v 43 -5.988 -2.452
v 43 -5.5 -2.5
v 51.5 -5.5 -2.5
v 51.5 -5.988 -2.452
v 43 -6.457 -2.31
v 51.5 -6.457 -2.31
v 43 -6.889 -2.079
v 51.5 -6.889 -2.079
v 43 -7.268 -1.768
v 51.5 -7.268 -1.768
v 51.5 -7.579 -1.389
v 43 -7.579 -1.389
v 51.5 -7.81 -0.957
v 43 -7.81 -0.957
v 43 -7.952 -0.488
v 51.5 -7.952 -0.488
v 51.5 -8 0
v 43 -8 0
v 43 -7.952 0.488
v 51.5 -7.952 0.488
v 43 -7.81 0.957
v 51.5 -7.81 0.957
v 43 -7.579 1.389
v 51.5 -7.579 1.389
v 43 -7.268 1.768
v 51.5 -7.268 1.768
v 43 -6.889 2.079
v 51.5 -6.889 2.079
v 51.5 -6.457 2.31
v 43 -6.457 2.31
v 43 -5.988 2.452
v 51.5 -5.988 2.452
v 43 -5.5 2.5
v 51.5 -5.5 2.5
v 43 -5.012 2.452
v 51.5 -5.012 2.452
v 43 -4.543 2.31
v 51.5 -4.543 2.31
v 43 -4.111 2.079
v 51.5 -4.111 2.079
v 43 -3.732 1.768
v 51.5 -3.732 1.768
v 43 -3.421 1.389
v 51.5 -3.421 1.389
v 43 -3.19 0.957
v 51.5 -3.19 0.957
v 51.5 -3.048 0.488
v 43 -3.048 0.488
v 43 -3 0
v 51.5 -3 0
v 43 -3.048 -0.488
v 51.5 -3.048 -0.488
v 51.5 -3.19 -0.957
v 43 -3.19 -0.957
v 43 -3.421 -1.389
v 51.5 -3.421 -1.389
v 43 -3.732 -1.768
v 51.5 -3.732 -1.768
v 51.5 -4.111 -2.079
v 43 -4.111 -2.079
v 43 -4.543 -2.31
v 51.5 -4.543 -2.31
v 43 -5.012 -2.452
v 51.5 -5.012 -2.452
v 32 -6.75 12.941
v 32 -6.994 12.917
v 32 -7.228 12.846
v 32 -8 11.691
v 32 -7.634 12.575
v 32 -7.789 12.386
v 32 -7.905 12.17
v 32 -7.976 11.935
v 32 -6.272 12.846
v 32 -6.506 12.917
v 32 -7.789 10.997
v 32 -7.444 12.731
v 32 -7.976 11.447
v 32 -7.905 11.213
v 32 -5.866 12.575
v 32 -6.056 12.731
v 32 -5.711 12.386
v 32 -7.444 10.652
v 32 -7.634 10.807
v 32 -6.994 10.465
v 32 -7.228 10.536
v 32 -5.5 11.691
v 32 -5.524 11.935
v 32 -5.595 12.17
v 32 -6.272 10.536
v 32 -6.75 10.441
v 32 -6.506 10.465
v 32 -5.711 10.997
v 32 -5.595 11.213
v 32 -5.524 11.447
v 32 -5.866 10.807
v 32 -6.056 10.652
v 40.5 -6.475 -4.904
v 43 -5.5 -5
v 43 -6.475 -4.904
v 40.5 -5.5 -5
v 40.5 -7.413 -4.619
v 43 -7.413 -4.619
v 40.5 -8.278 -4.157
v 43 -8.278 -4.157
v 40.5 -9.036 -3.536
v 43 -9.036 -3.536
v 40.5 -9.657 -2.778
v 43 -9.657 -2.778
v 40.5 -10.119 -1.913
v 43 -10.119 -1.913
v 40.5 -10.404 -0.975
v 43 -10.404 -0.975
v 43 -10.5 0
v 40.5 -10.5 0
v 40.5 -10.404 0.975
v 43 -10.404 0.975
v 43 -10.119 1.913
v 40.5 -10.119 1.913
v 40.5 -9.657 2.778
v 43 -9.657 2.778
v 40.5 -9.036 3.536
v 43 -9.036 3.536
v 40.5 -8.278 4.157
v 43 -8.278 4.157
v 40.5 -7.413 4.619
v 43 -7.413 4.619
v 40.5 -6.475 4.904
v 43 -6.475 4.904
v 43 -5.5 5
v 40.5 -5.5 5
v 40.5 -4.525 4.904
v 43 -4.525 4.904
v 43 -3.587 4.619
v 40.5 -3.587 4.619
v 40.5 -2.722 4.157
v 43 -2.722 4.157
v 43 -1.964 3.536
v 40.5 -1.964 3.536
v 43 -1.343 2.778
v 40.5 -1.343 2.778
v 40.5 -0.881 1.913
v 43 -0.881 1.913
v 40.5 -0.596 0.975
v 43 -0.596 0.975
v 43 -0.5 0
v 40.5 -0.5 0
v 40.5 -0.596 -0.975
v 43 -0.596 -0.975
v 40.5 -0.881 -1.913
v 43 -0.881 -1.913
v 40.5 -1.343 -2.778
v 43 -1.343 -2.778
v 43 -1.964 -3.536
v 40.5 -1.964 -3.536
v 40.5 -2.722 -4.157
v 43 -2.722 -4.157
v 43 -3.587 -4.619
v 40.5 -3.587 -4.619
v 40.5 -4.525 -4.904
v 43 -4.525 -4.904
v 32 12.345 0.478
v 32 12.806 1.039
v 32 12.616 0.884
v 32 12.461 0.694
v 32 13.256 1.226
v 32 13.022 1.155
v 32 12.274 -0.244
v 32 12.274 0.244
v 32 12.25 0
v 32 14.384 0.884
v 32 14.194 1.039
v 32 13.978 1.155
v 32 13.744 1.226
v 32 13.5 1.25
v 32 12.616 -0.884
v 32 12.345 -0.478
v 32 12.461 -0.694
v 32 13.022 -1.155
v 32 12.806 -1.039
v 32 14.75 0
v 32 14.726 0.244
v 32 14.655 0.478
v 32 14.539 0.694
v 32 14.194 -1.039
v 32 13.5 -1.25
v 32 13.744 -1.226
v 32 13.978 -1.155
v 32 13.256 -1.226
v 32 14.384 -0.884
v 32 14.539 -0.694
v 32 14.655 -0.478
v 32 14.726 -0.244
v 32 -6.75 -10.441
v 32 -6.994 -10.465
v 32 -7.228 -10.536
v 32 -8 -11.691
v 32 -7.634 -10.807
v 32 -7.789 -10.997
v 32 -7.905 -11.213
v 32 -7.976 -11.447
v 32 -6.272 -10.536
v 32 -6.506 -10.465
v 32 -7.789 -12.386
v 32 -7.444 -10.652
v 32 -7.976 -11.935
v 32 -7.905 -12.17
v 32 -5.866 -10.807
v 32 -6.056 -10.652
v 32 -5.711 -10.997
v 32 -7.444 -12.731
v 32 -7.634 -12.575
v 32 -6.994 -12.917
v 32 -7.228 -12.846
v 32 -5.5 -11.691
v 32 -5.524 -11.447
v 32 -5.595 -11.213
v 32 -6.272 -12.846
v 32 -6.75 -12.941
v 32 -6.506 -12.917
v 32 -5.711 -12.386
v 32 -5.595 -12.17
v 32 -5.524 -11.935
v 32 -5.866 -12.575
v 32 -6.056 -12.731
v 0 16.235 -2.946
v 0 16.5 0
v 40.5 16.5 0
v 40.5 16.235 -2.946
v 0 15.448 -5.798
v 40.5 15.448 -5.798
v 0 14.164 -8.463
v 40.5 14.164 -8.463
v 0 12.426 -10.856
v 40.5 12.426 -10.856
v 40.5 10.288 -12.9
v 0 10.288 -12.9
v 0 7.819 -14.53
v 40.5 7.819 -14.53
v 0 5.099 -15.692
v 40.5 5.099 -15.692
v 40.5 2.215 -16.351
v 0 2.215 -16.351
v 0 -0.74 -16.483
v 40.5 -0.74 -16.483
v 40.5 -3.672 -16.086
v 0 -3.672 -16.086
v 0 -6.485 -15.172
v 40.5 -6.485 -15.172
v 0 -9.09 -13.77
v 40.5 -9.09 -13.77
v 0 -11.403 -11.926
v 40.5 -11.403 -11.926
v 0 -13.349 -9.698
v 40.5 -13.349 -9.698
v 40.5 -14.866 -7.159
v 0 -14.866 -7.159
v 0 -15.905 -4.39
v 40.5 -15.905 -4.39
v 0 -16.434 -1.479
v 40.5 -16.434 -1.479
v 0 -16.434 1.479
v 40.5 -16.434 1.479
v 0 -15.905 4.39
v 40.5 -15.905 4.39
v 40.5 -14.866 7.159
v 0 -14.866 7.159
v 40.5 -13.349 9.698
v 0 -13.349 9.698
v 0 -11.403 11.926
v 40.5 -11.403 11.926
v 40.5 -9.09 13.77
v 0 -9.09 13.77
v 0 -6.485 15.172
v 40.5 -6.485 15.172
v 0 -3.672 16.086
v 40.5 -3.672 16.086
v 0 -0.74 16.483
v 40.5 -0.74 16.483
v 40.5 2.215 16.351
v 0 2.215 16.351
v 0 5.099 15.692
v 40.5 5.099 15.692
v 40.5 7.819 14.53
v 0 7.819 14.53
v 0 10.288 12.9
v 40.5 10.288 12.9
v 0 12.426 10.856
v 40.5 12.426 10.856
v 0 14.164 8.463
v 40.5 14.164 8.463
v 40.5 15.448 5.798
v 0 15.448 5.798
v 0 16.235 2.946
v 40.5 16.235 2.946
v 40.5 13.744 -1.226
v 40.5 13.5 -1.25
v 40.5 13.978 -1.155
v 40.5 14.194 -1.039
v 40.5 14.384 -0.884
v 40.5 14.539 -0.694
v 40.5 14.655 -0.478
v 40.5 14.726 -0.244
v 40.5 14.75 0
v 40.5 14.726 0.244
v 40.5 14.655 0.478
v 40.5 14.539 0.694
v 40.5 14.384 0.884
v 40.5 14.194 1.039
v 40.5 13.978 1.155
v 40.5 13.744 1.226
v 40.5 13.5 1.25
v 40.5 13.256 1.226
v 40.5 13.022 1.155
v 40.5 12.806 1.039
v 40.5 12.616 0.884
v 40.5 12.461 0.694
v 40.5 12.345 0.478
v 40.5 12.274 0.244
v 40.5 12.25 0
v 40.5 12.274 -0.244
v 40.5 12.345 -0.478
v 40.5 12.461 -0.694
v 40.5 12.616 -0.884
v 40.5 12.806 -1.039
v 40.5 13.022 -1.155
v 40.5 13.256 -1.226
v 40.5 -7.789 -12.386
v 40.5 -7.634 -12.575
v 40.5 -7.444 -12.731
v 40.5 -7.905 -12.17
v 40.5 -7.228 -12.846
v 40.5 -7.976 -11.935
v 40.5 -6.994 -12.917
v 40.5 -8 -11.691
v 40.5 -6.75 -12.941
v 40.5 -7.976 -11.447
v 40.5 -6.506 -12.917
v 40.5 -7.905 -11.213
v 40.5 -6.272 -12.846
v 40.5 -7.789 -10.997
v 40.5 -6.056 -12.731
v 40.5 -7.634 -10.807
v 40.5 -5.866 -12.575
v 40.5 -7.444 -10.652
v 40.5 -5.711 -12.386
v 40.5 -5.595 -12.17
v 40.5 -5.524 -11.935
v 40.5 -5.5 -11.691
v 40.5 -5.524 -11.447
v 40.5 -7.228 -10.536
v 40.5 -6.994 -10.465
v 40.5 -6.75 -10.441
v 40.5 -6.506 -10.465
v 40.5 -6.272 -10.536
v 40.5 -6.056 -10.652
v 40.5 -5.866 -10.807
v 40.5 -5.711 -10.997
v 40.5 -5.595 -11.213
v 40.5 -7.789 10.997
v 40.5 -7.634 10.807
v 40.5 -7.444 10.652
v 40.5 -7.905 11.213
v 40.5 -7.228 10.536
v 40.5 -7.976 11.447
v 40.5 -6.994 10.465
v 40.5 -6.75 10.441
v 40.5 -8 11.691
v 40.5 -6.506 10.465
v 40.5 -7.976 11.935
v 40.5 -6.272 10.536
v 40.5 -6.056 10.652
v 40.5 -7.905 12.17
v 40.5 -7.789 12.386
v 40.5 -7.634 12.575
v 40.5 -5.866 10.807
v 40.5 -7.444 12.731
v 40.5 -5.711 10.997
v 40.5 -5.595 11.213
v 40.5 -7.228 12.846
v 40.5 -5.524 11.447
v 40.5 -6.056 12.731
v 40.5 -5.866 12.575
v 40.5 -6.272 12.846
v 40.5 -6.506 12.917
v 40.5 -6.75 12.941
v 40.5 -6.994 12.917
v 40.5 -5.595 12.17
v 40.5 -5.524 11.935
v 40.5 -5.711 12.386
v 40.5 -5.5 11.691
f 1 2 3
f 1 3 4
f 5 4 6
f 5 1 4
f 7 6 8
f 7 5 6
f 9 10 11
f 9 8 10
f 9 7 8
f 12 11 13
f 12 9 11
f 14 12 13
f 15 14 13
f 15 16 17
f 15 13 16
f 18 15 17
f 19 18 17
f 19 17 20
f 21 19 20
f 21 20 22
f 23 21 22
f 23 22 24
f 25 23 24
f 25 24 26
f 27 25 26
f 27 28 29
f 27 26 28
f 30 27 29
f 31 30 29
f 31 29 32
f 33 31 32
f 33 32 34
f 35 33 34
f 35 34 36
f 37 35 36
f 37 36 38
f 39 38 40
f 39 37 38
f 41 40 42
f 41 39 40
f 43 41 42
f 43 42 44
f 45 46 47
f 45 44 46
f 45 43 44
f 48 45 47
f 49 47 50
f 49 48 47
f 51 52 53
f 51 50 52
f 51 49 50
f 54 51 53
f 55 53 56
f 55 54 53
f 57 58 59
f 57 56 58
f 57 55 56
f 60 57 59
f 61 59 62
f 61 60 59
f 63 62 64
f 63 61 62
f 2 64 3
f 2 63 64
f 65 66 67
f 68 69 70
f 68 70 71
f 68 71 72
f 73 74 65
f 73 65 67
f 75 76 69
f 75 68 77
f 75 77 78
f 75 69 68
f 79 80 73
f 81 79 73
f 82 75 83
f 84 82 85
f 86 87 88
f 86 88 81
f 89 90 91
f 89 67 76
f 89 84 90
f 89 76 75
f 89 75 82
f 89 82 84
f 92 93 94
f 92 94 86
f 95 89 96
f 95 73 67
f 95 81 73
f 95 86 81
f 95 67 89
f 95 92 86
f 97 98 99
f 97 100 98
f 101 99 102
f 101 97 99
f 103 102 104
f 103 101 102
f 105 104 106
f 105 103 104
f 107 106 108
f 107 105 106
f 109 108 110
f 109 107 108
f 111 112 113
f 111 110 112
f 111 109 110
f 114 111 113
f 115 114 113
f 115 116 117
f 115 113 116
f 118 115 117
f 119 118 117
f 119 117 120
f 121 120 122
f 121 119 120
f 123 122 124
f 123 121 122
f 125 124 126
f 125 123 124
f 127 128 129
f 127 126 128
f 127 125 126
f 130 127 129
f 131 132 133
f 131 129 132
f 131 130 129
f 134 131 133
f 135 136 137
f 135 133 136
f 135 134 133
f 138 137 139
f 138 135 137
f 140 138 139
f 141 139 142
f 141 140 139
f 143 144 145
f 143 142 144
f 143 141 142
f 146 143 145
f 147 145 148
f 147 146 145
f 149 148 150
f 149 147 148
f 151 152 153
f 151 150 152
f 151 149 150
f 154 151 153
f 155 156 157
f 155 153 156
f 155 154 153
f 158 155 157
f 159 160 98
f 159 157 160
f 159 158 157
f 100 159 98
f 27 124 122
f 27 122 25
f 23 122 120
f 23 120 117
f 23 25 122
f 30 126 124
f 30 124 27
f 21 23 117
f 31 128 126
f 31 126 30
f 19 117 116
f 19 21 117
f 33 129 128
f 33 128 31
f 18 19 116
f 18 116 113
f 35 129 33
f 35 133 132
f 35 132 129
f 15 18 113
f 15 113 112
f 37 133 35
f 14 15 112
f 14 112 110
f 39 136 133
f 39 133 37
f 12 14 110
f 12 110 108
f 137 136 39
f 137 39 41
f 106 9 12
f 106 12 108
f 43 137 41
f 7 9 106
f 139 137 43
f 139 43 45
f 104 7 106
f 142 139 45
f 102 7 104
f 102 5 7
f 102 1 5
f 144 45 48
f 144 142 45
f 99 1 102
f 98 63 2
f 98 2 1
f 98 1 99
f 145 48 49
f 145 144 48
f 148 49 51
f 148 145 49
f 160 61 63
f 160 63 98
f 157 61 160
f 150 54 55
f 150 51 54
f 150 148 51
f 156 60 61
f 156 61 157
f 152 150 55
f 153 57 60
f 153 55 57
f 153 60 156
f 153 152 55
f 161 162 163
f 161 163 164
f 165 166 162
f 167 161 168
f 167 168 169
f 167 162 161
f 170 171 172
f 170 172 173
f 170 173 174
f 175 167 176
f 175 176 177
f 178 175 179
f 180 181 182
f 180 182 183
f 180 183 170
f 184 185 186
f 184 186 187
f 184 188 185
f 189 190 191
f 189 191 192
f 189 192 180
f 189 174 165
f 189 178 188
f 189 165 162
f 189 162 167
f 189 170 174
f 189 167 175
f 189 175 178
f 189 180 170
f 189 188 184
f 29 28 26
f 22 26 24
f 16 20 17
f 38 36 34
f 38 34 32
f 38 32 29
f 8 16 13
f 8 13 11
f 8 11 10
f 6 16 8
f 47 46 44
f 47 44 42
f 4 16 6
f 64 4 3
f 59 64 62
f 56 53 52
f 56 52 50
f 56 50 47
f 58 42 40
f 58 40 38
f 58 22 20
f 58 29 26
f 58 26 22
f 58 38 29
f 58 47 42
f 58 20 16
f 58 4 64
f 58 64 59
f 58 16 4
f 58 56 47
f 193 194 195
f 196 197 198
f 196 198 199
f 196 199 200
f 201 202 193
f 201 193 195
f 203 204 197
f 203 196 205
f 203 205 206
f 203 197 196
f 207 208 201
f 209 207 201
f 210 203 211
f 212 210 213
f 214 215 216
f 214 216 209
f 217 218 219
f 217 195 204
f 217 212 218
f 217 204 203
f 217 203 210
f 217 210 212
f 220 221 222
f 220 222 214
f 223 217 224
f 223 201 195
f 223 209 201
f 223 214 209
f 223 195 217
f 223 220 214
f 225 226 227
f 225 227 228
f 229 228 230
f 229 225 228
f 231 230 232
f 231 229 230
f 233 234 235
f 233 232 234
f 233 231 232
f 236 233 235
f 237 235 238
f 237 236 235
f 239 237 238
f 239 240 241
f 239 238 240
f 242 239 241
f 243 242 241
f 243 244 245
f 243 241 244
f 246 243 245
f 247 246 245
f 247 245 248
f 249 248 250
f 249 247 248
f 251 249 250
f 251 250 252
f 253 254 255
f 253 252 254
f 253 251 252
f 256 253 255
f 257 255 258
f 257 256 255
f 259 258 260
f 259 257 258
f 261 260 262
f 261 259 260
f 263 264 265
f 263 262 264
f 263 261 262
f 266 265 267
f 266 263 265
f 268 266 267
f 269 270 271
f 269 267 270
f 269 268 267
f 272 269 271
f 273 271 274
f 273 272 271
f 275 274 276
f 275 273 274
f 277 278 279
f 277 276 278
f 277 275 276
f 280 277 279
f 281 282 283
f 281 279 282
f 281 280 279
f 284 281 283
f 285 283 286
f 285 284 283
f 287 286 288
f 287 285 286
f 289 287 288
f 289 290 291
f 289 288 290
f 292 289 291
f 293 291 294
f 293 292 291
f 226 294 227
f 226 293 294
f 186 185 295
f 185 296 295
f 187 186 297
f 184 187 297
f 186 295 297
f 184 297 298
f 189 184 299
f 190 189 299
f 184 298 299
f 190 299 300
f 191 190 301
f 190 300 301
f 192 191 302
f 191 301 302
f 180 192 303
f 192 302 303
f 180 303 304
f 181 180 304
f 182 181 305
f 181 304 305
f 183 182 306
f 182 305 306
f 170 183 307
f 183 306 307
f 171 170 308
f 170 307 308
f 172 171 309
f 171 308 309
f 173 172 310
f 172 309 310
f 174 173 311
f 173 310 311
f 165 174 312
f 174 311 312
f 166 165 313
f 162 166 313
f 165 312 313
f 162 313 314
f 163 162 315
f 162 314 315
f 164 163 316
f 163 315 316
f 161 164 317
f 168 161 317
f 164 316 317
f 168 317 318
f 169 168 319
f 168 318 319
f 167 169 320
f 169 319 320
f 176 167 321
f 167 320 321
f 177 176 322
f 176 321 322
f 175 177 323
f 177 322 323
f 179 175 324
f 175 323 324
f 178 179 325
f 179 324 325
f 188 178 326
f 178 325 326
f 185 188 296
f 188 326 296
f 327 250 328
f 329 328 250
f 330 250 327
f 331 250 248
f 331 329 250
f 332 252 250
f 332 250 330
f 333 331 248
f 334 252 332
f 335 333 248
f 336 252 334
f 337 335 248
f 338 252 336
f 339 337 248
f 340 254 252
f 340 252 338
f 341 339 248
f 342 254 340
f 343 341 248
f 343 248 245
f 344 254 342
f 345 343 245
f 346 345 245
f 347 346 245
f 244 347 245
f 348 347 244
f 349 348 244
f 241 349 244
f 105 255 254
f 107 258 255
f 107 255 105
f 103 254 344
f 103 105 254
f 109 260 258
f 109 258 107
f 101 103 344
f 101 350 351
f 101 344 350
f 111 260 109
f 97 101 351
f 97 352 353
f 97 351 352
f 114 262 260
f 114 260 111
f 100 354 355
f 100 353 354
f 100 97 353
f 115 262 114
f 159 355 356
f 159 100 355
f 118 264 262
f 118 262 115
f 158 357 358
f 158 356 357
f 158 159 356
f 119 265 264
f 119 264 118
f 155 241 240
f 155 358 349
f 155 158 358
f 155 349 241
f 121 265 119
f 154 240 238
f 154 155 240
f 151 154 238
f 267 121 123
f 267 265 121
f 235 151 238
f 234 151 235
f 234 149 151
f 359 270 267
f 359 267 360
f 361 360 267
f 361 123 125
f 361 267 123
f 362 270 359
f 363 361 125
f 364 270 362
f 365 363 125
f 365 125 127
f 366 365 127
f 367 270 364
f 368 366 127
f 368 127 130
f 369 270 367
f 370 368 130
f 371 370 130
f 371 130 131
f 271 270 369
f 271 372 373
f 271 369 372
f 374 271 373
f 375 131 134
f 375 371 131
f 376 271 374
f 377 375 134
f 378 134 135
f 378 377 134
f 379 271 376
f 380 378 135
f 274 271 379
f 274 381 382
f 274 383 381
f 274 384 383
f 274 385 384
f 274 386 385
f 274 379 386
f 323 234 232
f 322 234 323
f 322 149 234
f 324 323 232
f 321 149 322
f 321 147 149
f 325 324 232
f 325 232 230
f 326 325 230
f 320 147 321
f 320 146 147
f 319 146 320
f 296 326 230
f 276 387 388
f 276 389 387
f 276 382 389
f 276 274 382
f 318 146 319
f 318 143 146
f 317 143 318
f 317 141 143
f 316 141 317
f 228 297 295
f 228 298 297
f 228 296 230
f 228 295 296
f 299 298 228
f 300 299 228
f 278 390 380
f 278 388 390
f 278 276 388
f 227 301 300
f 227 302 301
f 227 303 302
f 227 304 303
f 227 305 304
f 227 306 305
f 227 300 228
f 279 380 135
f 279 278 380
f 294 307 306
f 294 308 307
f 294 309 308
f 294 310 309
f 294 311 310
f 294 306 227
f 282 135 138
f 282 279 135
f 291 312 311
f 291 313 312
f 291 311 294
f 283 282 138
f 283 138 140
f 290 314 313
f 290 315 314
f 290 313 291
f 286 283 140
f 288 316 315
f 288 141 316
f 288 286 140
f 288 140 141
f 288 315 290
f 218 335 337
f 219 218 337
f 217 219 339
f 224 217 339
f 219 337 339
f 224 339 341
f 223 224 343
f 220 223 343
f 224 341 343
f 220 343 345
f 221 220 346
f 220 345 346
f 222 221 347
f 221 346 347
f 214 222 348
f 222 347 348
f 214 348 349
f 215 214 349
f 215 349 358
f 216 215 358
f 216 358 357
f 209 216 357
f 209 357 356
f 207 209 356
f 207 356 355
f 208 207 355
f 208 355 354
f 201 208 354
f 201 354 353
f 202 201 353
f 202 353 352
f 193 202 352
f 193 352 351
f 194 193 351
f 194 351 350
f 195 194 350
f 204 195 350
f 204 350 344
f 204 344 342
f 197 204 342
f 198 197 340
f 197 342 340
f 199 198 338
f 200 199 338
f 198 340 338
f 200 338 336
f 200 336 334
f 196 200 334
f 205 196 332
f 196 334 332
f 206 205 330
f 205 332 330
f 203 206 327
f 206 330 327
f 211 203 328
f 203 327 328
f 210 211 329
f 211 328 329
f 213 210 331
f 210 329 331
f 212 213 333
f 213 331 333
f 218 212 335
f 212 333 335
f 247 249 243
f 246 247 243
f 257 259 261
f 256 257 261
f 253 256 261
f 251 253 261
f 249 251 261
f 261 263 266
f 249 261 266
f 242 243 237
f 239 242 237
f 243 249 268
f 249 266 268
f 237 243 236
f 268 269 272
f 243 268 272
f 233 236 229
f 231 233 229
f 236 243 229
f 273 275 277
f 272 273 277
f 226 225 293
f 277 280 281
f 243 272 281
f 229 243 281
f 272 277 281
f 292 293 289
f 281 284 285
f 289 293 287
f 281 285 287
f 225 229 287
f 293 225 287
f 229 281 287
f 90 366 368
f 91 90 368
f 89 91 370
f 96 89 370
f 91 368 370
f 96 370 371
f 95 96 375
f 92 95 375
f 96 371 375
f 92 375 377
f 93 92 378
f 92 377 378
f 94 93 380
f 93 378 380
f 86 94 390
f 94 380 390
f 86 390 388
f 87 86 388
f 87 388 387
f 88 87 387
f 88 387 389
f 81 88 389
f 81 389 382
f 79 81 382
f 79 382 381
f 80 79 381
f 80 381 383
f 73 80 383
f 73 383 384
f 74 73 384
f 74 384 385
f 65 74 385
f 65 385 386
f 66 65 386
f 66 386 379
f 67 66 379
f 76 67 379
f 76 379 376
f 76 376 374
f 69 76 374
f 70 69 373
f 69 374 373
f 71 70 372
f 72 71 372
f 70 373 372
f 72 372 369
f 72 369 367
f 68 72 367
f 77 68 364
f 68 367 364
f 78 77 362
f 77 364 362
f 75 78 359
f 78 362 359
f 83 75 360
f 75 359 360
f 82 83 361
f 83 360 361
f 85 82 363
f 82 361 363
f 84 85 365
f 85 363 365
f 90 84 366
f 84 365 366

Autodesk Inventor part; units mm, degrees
ref_plane "YZ Plane" through (0, 0, 0) normal (1, 0, 0) x (0, 1, 0)
ref_plane "XZ Plane" through (0, 0, 0) normal (0, 1, 0) x (-1, 0, 0)
ref_plane "XY Plane" through (0, 0, 0) normal (0, 0, 1) x (1, 0, 0)
sketch "Sketch1" plane through (0, 0, 0) normal (1, 0, 0) x (0, 1, 0)
  circle A0 centre (0, 0) radius 16.5
  dimension "d0" = 33
extrude "Extrusion1" add sketch "Sketch1" along normal blind 40.5
sketch "Sketch2" plane through (40.5, 0, 0) normal (1, 0, 0) x (0, 0, -1)
  circle A0 centre (0, 0) radius 16.5 projected
  circle A1 centre (0, -5.5) radius 5
extrude "Extrusion2" add sketch "Sketch2" along normal blind 2.5 contours A1
sketch "Sketch3" plane through (43, -5.5, 0) normal (1, 0, 0) x (0, 0, -1)
  circle A0 centre (0, 0) radius 2.5
  point P0 (0, 5.5)
  dimension "d7" = 5
extrude "Extrusion3" add sketch "Sketch3" along normal blind 8.5
sketch "Sketch4" plane through (40.5, 0, 0) normal (1, 0, 0) x (0, 0, -1)
  circle A0 centre (0, 0) radius 16.5 projected
  circle A1 centre (0, 13.5) radius 1.25
  circle A2 centre (-11.6913, -6.75) radius 1.25
  circle A3 centre (11.6913, -6.75) radius 1.25
  dimension "d11" = 2.5
  dimension "d14" = 360
extrude "Extrusion4" cut sketch "Sketch4" against normal blind 8.5 contours A1 | A2 | A3
properties part number "Motor"
